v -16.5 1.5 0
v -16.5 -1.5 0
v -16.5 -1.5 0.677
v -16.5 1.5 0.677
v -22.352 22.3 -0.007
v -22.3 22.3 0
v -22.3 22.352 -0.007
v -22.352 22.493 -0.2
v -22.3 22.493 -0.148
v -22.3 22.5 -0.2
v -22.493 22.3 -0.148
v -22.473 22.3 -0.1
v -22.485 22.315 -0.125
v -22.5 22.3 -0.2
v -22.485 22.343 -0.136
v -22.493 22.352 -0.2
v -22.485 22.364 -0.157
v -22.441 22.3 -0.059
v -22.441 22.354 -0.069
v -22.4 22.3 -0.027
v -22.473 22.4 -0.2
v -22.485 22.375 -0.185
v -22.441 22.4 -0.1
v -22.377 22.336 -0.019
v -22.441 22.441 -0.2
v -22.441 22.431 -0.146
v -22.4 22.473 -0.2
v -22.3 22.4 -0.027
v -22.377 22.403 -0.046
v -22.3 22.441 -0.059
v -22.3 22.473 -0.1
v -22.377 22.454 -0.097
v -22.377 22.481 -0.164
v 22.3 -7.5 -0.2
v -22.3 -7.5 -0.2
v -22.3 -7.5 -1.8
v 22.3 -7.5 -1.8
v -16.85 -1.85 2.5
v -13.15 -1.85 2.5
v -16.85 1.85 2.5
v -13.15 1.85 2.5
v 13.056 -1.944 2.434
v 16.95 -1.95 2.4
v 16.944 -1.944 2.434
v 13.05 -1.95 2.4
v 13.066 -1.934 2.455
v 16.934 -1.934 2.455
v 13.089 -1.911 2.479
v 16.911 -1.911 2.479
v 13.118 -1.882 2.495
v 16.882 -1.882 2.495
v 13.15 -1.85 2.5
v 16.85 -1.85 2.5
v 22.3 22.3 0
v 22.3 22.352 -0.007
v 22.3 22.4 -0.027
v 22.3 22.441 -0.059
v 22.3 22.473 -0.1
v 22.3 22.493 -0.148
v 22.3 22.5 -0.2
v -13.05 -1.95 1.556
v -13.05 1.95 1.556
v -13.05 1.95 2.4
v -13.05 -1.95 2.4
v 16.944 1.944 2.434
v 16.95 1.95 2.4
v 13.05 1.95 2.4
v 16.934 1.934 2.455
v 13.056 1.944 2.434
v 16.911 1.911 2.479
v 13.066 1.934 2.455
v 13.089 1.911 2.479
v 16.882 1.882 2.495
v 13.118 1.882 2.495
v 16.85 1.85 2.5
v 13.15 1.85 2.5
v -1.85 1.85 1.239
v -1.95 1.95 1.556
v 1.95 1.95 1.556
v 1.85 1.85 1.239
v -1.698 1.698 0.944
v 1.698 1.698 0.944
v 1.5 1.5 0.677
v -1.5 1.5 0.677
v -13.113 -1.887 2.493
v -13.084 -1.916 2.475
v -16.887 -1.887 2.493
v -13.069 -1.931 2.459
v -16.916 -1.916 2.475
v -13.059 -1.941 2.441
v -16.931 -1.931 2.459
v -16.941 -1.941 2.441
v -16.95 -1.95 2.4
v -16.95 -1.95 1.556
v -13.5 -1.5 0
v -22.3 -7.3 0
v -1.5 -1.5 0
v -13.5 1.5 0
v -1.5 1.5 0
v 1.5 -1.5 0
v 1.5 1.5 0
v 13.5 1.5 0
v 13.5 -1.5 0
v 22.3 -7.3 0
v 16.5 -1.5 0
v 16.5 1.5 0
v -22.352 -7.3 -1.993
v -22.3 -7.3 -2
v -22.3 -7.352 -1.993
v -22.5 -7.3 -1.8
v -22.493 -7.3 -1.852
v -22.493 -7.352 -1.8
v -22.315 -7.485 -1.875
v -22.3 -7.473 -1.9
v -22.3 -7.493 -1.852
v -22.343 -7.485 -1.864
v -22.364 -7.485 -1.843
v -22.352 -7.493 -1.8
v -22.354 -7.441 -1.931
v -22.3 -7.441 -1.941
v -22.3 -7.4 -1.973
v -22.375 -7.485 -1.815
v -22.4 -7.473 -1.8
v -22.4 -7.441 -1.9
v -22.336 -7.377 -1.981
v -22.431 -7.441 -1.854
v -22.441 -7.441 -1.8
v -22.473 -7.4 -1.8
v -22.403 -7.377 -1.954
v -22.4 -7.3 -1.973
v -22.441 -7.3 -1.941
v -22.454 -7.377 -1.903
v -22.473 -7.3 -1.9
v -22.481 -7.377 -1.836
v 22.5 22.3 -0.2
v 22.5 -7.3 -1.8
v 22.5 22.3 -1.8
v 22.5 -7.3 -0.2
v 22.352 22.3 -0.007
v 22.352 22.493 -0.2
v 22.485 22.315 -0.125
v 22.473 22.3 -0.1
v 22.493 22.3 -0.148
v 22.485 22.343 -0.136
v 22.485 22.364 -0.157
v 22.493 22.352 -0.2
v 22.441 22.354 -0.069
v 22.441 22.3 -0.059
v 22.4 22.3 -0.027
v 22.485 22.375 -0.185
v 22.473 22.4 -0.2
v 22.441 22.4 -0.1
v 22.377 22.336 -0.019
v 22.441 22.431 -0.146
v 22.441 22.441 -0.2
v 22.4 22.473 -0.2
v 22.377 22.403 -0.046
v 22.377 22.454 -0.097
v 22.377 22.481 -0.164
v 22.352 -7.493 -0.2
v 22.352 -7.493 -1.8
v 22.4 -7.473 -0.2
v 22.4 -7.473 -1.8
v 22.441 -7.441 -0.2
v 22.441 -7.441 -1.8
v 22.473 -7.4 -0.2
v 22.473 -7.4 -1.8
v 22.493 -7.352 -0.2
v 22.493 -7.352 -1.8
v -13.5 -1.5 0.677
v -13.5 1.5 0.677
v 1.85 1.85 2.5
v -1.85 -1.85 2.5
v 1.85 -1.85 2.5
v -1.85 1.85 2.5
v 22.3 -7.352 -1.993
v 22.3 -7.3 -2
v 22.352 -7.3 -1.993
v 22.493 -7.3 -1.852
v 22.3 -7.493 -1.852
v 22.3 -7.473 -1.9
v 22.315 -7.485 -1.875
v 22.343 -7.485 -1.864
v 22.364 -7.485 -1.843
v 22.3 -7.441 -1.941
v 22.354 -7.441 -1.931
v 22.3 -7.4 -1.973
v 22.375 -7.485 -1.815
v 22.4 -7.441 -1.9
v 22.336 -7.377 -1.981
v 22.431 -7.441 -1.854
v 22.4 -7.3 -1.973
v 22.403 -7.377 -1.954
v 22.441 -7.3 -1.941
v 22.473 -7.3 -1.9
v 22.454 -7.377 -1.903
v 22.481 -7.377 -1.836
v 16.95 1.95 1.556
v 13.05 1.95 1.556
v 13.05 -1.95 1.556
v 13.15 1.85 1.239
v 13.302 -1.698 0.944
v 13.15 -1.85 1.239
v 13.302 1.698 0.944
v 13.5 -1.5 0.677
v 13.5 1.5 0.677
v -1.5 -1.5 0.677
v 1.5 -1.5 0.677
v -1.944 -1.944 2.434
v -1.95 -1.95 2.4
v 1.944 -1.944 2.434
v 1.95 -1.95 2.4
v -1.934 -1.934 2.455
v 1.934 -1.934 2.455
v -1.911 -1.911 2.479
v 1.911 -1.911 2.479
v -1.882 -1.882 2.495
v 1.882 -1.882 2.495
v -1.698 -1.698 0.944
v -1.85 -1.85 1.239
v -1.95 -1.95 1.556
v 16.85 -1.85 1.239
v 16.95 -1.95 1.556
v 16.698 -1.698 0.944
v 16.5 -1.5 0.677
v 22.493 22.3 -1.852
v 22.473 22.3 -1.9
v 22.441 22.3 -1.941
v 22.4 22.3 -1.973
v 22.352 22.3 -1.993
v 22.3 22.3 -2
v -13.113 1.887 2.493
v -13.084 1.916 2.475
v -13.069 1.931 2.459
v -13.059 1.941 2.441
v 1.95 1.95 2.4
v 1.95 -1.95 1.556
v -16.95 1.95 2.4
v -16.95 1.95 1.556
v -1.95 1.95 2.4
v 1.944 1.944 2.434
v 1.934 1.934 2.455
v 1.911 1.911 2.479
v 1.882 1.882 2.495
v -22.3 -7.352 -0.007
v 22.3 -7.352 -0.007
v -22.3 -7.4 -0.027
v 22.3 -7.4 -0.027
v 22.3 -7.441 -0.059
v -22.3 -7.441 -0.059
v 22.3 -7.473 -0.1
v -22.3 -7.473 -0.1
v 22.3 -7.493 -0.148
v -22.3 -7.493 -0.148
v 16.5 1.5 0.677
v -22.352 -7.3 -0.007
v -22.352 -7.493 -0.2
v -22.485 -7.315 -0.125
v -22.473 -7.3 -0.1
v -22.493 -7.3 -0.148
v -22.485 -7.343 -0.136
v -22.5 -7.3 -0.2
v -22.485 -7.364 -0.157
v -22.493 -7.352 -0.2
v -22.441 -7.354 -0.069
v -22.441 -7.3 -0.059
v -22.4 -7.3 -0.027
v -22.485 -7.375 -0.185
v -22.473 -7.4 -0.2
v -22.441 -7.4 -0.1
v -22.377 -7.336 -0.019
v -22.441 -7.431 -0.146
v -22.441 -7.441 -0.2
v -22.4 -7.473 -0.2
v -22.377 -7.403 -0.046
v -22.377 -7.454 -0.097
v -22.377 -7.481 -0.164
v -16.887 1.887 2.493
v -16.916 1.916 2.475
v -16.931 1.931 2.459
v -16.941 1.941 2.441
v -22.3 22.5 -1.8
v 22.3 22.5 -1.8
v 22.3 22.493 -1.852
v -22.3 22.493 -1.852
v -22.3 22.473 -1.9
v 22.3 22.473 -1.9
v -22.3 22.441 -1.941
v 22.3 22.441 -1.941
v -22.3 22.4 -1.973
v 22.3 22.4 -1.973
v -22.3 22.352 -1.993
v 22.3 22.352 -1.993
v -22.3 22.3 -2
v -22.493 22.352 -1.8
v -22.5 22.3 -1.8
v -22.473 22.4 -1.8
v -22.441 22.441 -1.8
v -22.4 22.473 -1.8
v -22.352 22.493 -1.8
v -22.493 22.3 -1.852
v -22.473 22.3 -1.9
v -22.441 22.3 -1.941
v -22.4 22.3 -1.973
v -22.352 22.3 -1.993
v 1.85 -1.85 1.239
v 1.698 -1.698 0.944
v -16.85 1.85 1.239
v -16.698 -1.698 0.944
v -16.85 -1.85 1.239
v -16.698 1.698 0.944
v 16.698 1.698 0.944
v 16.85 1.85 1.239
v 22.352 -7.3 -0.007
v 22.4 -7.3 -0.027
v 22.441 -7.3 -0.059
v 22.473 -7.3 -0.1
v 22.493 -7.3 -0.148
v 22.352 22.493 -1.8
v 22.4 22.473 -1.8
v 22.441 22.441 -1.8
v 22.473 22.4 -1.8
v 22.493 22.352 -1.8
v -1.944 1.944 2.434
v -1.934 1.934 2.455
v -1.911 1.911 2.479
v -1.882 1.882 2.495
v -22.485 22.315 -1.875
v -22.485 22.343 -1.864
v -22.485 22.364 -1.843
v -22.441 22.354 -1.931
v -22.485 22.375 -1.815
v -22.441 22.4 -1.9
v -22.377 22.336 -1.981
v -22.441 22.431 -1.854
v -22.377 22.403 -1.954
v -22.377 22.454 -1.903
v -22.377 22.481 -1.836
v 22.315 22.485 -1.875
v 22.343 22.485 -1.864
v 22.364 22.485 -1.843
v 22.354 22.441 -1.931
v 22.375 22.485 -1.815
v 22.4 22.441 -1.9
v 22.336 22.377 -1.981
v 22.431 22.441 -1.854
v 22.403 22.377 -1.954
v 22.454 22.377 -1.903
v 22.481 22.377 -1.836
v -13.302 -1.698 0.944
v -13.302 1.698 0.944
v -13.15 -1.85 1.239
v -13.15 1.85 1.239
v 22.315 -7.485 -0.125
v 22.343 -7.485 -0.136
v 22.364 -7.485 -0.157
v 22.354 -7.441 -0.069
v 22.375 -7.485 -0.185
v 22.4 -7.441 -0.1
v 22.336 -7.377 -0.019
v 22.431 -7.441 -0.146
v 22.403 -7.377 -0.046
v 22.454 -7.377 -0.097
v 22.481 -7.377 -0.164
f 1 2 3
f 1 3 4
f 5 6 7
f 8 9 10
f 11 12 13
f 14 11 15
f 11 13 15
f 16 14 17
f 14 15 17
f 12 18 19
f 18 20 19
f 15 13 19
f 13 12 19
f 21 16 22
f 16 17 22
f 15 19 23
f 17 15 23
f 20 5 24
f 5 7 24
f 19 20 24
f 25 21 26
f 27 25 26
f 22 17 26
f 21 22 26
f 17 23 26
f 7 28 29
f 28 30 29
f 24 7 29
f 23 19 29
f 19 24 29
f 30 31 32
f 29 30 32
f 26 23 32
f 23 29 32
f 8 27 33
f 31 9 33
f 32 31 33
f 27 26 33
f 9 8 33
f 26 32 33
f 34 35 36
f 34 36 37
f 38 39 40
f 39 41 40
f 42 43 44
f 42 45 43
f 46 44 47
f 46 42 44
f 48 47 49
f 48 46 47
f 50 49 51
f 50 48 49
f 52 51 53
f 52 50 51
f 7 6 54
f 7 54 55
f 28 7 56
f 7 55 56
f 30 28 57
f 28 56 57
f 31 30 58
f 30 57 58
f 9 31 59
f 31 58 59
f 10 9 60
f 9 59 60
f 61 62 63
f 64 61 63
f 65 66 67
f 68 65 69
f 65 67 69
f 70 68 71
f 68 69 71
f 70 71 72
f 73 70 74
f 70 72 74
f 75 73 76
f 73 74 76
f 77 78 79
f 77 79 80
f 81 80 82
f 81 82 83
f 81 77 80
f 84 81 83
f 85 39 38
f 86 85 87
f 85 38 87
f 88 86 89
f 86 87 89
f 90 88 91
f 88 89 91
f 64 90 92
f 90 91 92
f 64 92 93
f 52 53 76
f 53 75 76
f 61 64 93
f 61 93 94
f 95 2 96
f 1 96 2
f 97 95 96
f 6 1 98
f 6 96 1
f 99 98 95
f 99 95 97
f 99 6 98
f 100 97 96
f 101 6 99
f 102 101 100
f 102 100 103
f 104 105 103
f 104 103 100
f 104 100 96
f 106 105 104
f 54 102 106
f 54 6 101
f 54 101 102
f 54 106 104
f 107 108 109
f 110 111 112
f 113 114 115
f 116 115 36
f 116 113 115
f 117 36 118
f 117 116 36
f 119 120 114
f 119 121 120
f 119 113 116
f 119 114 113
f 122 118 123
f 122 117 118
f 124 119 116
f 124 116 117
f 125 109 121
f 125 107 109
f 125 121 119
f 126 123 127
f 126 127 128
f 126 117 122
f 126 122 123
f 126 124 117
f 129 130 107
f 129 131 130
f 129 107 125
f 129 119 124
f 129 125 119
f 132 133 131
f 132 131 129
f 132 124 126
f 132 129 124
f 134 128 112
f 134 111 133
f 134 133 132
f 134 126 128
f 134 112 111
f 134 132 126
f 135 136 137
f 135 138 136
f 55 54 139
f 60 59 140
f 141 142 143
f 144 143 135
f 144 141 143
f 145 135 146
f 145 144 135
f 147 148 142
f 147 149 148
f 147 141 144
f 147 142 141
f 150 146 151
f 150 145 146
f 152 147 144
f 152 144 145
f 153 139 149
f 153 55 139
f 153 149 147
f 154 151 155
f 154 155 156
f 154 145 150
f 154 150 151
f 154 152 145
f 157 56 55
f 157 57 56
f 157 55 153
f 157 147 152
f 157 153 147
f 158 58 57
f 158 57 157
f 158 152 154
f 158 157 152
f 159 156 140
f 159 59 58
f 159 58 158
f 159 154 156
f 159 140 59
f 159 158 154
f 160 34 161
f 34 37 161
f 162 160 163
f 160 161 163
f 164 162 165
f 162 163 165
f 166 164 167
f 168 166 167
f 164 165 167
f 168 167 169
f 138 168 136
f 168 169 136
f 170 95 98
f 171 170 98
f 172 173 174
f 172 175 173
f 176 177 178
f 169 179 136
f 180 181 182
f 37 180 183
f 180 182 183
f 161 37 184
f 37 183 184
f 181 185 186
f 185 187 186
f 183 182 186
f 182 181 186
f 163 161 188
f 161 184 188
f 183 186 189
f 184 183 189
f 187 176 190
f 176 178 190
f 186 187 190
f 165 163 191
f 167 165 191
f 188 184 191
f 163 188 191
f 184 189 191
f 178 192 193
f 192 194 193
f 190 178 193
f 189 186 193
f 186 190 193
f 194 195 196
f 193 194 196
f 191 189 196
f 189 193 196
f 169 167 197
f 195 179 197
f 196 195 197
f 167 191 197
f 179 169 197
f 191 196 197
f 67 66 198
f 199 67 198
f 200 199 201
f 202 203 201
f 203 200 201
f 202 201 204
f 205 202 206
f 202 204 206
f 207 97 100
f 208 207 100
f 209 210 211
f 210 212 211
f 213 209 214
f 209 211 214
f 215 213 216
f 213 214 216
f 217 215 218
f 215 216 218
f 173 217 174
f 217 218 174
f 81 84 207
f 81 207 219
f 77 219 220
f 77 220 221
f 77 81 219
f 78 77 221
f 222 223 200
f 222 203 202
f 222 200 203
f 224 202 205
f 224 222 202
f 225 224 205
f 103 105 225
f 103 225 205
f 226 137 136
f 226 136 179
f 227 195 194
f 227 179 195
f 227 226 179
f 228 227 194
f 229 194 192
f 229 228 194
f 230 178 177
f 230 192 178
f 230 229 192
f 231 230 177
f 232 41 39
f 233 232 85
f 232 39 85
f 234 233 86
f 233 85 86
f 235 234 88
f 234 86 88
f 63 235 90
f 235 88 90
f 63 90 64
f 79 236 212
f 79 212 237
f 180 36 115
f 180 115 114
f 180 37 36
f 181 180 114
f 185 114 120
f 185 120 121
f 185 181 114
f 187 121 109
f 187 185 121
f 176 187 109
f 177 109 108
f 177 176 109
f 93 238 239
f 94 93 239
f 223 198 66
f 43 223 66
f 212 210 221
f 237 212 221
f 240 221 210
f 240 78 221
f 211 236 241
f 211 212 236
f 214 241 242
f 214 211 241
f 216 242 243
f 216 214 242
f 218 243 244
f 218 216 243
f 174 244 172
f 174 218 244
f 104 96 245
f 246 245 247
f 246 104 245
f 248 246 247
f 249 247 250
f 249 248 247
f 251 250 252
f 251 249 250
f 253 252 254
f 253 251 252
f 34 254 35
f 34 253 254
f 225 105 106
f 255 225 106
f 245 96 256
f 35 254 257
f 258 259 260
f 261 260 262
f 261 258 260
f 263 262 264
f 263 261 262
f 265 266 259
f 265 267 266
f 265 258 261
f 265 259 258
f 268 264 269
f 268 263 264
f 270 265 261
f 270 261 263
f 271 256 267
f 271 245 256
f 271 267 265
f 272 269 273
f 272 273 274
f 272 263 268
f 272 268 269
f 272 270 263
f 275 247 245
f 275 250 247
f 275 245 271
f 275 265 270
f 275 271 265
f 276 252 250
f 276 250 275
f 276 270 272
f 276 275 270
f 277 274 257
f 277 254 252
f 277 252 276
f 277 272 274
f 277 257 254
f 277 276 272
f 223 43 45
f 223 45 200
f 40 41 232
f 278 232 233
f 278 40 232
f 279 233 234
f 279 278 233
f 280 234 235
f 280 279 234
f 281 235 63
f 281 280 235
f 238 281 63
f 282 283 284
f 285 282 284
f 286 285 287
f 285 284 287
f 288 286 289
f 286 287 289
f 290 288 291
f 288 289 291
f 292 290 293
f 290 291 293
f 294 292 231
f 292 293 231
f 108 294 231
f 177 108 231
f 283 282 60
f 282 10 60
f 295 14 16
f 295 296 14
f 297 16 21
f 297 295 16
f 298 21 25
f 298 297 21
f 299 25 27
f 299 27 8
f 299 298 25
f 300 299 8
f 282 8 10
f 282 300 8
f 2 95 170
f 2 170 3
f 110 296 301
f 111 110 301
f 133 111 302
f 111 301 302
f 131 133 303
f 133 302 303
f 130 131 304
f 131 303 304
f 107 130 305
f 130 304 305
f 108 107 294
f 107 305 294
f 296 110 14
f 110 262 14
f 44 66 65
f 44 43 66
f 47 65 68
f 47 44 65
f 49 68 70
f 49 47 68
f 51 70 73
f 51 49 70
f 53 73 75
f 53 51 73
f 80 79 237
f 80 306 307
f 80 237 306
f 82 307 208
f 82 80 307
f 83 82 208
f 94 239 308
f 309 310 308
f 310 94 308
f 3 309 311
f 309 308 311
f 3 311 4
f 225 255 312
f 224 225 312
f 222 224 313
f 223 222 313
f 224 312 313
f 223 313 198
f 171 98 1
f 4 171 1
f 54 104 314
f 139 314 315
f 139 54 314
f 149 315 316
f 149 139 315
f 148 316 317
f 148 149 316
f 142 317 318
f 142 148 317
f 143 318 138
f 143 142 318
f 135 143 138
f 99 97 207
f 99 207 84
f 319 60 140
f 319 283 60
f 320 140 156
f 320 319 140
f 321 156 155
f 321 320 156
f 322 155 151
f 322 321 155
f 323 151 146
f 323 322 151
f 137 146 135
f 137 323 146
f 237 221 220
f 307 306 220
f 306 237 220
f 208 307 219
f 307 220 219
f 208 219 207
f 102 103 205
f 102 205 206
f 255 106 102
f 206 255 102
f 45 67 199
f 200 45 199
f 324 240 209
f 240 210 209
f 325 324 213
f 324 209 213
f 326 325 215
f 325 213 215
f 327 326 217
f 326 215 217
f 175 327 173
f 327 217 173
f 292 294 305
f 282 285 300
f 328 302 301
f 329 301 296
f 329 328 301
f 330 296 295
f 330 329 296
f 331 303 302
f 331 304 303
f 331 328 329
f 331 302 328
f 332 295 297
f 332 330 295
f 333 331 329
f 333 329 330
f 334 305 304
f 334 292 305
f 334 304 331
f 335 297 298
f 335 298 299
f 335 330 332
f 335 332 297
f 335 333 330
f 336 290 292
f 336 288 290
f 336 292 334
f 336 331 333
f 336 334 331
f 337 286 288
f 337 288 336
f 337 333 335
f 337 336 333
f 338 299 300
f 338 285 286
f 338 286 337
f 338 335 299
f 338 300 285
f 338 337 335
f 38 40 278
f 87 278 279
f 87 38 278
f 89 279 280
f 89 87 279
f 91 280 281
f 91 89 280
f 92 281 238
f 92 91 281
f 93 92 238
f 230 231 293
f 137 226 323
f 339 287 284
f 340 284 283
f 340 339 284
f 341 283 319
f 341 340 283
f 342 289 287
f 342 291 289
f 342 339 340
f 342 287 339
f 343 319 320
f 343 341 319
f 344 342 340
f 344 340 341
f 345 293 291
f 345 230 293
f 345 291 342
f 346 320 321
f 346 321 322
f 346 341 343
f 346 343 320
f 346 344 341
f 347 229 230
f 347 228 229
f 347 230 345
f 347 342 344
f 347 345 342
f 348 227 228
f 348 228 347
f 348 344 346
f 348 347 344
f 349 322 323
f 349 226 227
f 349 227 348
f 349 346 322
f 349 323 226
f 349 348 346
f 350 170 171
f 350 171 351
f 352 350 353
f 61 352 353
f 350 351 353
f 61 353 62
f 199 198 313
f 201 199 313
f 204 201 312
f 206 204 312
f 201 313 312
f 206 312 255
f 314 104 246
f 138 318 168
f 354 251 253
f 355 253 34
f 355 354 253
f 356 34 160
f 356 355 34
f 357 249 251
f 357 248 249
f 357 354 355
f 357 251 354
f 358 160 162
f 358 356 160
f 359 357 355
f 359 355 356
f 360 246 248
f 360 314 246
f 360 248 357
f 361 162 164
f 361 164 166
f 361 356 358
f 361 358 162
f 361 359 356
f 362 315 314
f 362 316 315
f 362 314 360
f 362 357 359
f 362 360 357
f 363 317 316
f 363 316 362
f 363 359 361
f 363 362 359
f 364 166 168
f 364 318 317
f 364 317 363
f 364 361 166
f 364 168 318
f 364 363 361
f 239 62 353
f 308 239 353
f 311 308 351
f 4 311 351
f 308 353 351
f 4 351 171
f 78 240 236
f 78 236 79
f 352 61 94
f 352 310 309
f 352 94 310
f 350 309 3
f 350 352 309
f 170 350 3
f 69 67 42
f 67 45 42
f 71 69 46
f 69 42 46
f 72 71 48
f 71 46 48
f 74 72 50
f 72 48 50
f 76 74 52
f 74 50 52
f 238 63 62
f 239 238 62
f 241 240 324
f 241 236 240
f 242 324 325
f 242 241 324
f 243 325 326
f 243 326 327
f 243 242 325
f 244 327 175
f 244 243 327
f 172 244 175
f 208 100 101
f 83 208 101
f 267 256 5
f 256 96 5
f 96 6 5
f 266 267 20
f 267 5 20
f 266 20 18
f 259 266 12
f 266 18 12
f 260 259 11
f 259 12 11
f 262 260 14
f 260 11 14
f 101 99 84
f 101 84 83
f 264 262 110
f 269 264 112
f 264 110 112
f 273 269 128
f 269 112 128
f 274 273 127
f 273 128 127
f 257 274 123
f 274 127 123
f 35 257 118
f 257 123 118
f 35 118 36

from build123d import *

# Parameters (mm, degrees)
SKETCH_1_W          = 45
SKETCH_1_H          = 30
EXTRUDE_1_DEPTH     = 2
SKETCH_2_W          = 3
SKETCH_2_H          = 3
EXTRUDE_2_DEPTH     = 1
EXTRUDE_START       = -4
EXTRUDE_3_DEPTH     = 5
CUT_EXTRUDE_1_REACH = 35.321
FILLET_1_R          = 0.1
FILLET_2_R          = 0.2


with BuildPart() as part:
    # 草图1 → 凸台-拉伸1 (new body)
    with BuildSketch(Plane.XY):
        with Locations((0, 7.5)):
            Rectangle(SKETCH_1_W, SKETCH_1_H)
    extrude(amount=-EXTRUDE_1_DEPTH)

    # 草图2 → 凸台-拉伸2 (add)
    with BuildSketch(Plane.XY):
        Rectangle(SKETCH_2_W, SKETCH_2_H)
    extrude_2 = extrude(amount=EXTRUDE_2_DEPTH)

    # 草图3 → 凸台-拉伸3 (add)
    with BuildSketch(Plane.XZ.offset(1.5).offset(EXTRUDE_START)):
        with BuildLine():
            Line((-1.95, 2.5), (1.95, 2.5))
            Line((1.95, 2.5), (1.95, 1.555590279))
            ThreePointArc((1.95, 1.555590279), (1.780042303, 1.088161527), (1.5, 0.677124344))
            Line((1.5, 0.677124344), (-1.5, 0.677124344))
            ThreePointArc((-1.5, 0.677124344), (-1.780042303, 1.088161527), (-1.95, 1.555590279))
            Line((-1.95, 1.555590279), (-1.95, 2.5))
        make_face()
    extrude_3 = extrude(amount=EXTRUDE_3_DEPTH)

    # 草图4 → 切除-拉伸1 (cut, up to next)
    with BuildSketch(Plane.ZY.offset(1.95), mode=Mode.PRIVATE) as cut_extrude_1_sk1:
        with BuildLine():
            Line((0.677124344, 1.5), (0.677124344, 2.5))
            Line((0.677124344, 2.5), (2.5, 2.5))
            Line((2.5, 2.5), (2.5, 1.95))
            Line((2.5, 1.95), (1.555590279, 1.95))
            ThreePointArc((1.555590279, 1.95), (1.088161527, 1.780042303), (0.677124344, 1.5))
        make_face()
    cut_extrude_1_tool1 = extrude(cut_extrude_1_sk1.sketch, amount=-CUT_EXTRUDE_1_REACH, mode=Mode.PRIVATE) & part.part
    # 草图4 → 切除-拉伸1 (cut, up to next)
    with BuildSketch(Plane.ZY.offset(1.95), mode=Mode.PRIVATE) as cut_extrude_1_sk2:
        with BuildLine():
            Line((0.677124344, -2.5), (2.5, -2.5))
            Line((2.5, -2.5), (2.5, -1.95))
            Line((2.5, -1.95), (1.555590279, -1.95))
            ThreePointArc((1.555590279, -1.95), (1.088161527, -1.780042303), (0.677124344, -1.5))
            Line((0.677124344, -1.5), (0.677124344, -2.5))
        make_face()
    cut_extrude_1_tool2 = extrude(cut_extrude_1_sk2.sketch, amount=-CUT_EXTRUDE_1_REACH, mode=Mode.PRIVATE) & part.part
    cut_extrude_1_1 = cut_extrude_1_tool1.solids().sort_by_distance((-1.95, 2.169375, 1.500125))[0]
    add(cut_extrude_1_1, mode=Mode.SUBTRACT)
    cut_extrude_1_2 = cut_extrude_1_tool2.solids().sort_by_distance((-1.95, -2.169375, 1.500125))[0]
    add(cut_extrude_1_2, mode=Mode.SUBTRACT)
    cut_extrude_1 = cut_extrude_1_1 + cut_extrude_1_2  # 切除-拉伸1 as one shape, for the pattern or mirror that repeats it

    # 镜向1: 凸台-拉伸2, 凸台-拉伸3, 切除-拉伸1 across plane
    add(extrude_2.mirror(Plane(origin=(7.5, 0, 0), x_dir=(0, 0, 1), z_dir=(1, 0, 0))))
    add(extrude_3.mirror(Plane(origin=(7.5, 0, 0), x_dir=(0, 0, 1), z_dir=(1, 0, 0))))
    add(cut_extrude_1.mirror(Plane(origin=(7.5, 0, 0), x_dir=(0, 0, 1), z_dir=(1, 0, 0))), mode=Mode.SUBTRACT)

    # 镜向2: 凸台-拉伸2, 凸台-拉伸3, 切除-拉伸1 across plane
    add(extrude_2.mirror(Plane(origin=(-7.5, 0, 0), x_dir=(0, 0, 1), z_dir=(1, 0, 0))))
    add(extrude_3.mirror(Plane(origin=(-7.5, 0, 0), x_dir=(0, 0, 1), z_dir=(1, 0, 0))))
    add(cut_extrude_1.mirror(Plane(origin=(-7.5, 0, 0), x_dir=(0, 0, 1), z_dir=(1, 0, 0))), mode=Mode.SUBTRACT)

    # 圆角1
    fillet_1_edges = [part.edges().sort_by_distance(p)[0] for p in [
        (15, -1.95, 2.5),
        (16.95, 0, 2.5),
        (13.05, 0, 2.5),
        (15, 1.95, 2.5),
        (-15, -1.95, 2.5),
        (-13.05, 0, 2.5),
        (-16.95, 0, 2.5),
        (-15, 1.95, 2.5),
        (0, -1.95, 2.5),
        (1.95, 0, 2.5),
        (-1.95, 0, 2.5),
        (0, 1.95, 2.5),
    ]]
    fillet(fillet_1_edges, radius=FILLET_1_R)

    # 圆角2
    fillet_2_edges = [part.edges().sort_by_distance(p)[0] for p in [
        (22.5, 7.5, -2),
        (0, 22.5, -2),
        (-22.5, 7.5, -2),
        (0, 22.5, 0),
        (22.5, 7.5, 0),
        (0, -7.5, 0),
        (-22.5, 7.5, 0),
        (0, -7.5, -2),
        (-22.5, 22.5, -1),
        (22.5, 22.5, -1),
        (22.5, -7.5, -1),
        (-22.5, -7.5, -1),
    ]]
    fillet(fillet_2_edges, radius=FILLET_2_R)


solid = part.part
